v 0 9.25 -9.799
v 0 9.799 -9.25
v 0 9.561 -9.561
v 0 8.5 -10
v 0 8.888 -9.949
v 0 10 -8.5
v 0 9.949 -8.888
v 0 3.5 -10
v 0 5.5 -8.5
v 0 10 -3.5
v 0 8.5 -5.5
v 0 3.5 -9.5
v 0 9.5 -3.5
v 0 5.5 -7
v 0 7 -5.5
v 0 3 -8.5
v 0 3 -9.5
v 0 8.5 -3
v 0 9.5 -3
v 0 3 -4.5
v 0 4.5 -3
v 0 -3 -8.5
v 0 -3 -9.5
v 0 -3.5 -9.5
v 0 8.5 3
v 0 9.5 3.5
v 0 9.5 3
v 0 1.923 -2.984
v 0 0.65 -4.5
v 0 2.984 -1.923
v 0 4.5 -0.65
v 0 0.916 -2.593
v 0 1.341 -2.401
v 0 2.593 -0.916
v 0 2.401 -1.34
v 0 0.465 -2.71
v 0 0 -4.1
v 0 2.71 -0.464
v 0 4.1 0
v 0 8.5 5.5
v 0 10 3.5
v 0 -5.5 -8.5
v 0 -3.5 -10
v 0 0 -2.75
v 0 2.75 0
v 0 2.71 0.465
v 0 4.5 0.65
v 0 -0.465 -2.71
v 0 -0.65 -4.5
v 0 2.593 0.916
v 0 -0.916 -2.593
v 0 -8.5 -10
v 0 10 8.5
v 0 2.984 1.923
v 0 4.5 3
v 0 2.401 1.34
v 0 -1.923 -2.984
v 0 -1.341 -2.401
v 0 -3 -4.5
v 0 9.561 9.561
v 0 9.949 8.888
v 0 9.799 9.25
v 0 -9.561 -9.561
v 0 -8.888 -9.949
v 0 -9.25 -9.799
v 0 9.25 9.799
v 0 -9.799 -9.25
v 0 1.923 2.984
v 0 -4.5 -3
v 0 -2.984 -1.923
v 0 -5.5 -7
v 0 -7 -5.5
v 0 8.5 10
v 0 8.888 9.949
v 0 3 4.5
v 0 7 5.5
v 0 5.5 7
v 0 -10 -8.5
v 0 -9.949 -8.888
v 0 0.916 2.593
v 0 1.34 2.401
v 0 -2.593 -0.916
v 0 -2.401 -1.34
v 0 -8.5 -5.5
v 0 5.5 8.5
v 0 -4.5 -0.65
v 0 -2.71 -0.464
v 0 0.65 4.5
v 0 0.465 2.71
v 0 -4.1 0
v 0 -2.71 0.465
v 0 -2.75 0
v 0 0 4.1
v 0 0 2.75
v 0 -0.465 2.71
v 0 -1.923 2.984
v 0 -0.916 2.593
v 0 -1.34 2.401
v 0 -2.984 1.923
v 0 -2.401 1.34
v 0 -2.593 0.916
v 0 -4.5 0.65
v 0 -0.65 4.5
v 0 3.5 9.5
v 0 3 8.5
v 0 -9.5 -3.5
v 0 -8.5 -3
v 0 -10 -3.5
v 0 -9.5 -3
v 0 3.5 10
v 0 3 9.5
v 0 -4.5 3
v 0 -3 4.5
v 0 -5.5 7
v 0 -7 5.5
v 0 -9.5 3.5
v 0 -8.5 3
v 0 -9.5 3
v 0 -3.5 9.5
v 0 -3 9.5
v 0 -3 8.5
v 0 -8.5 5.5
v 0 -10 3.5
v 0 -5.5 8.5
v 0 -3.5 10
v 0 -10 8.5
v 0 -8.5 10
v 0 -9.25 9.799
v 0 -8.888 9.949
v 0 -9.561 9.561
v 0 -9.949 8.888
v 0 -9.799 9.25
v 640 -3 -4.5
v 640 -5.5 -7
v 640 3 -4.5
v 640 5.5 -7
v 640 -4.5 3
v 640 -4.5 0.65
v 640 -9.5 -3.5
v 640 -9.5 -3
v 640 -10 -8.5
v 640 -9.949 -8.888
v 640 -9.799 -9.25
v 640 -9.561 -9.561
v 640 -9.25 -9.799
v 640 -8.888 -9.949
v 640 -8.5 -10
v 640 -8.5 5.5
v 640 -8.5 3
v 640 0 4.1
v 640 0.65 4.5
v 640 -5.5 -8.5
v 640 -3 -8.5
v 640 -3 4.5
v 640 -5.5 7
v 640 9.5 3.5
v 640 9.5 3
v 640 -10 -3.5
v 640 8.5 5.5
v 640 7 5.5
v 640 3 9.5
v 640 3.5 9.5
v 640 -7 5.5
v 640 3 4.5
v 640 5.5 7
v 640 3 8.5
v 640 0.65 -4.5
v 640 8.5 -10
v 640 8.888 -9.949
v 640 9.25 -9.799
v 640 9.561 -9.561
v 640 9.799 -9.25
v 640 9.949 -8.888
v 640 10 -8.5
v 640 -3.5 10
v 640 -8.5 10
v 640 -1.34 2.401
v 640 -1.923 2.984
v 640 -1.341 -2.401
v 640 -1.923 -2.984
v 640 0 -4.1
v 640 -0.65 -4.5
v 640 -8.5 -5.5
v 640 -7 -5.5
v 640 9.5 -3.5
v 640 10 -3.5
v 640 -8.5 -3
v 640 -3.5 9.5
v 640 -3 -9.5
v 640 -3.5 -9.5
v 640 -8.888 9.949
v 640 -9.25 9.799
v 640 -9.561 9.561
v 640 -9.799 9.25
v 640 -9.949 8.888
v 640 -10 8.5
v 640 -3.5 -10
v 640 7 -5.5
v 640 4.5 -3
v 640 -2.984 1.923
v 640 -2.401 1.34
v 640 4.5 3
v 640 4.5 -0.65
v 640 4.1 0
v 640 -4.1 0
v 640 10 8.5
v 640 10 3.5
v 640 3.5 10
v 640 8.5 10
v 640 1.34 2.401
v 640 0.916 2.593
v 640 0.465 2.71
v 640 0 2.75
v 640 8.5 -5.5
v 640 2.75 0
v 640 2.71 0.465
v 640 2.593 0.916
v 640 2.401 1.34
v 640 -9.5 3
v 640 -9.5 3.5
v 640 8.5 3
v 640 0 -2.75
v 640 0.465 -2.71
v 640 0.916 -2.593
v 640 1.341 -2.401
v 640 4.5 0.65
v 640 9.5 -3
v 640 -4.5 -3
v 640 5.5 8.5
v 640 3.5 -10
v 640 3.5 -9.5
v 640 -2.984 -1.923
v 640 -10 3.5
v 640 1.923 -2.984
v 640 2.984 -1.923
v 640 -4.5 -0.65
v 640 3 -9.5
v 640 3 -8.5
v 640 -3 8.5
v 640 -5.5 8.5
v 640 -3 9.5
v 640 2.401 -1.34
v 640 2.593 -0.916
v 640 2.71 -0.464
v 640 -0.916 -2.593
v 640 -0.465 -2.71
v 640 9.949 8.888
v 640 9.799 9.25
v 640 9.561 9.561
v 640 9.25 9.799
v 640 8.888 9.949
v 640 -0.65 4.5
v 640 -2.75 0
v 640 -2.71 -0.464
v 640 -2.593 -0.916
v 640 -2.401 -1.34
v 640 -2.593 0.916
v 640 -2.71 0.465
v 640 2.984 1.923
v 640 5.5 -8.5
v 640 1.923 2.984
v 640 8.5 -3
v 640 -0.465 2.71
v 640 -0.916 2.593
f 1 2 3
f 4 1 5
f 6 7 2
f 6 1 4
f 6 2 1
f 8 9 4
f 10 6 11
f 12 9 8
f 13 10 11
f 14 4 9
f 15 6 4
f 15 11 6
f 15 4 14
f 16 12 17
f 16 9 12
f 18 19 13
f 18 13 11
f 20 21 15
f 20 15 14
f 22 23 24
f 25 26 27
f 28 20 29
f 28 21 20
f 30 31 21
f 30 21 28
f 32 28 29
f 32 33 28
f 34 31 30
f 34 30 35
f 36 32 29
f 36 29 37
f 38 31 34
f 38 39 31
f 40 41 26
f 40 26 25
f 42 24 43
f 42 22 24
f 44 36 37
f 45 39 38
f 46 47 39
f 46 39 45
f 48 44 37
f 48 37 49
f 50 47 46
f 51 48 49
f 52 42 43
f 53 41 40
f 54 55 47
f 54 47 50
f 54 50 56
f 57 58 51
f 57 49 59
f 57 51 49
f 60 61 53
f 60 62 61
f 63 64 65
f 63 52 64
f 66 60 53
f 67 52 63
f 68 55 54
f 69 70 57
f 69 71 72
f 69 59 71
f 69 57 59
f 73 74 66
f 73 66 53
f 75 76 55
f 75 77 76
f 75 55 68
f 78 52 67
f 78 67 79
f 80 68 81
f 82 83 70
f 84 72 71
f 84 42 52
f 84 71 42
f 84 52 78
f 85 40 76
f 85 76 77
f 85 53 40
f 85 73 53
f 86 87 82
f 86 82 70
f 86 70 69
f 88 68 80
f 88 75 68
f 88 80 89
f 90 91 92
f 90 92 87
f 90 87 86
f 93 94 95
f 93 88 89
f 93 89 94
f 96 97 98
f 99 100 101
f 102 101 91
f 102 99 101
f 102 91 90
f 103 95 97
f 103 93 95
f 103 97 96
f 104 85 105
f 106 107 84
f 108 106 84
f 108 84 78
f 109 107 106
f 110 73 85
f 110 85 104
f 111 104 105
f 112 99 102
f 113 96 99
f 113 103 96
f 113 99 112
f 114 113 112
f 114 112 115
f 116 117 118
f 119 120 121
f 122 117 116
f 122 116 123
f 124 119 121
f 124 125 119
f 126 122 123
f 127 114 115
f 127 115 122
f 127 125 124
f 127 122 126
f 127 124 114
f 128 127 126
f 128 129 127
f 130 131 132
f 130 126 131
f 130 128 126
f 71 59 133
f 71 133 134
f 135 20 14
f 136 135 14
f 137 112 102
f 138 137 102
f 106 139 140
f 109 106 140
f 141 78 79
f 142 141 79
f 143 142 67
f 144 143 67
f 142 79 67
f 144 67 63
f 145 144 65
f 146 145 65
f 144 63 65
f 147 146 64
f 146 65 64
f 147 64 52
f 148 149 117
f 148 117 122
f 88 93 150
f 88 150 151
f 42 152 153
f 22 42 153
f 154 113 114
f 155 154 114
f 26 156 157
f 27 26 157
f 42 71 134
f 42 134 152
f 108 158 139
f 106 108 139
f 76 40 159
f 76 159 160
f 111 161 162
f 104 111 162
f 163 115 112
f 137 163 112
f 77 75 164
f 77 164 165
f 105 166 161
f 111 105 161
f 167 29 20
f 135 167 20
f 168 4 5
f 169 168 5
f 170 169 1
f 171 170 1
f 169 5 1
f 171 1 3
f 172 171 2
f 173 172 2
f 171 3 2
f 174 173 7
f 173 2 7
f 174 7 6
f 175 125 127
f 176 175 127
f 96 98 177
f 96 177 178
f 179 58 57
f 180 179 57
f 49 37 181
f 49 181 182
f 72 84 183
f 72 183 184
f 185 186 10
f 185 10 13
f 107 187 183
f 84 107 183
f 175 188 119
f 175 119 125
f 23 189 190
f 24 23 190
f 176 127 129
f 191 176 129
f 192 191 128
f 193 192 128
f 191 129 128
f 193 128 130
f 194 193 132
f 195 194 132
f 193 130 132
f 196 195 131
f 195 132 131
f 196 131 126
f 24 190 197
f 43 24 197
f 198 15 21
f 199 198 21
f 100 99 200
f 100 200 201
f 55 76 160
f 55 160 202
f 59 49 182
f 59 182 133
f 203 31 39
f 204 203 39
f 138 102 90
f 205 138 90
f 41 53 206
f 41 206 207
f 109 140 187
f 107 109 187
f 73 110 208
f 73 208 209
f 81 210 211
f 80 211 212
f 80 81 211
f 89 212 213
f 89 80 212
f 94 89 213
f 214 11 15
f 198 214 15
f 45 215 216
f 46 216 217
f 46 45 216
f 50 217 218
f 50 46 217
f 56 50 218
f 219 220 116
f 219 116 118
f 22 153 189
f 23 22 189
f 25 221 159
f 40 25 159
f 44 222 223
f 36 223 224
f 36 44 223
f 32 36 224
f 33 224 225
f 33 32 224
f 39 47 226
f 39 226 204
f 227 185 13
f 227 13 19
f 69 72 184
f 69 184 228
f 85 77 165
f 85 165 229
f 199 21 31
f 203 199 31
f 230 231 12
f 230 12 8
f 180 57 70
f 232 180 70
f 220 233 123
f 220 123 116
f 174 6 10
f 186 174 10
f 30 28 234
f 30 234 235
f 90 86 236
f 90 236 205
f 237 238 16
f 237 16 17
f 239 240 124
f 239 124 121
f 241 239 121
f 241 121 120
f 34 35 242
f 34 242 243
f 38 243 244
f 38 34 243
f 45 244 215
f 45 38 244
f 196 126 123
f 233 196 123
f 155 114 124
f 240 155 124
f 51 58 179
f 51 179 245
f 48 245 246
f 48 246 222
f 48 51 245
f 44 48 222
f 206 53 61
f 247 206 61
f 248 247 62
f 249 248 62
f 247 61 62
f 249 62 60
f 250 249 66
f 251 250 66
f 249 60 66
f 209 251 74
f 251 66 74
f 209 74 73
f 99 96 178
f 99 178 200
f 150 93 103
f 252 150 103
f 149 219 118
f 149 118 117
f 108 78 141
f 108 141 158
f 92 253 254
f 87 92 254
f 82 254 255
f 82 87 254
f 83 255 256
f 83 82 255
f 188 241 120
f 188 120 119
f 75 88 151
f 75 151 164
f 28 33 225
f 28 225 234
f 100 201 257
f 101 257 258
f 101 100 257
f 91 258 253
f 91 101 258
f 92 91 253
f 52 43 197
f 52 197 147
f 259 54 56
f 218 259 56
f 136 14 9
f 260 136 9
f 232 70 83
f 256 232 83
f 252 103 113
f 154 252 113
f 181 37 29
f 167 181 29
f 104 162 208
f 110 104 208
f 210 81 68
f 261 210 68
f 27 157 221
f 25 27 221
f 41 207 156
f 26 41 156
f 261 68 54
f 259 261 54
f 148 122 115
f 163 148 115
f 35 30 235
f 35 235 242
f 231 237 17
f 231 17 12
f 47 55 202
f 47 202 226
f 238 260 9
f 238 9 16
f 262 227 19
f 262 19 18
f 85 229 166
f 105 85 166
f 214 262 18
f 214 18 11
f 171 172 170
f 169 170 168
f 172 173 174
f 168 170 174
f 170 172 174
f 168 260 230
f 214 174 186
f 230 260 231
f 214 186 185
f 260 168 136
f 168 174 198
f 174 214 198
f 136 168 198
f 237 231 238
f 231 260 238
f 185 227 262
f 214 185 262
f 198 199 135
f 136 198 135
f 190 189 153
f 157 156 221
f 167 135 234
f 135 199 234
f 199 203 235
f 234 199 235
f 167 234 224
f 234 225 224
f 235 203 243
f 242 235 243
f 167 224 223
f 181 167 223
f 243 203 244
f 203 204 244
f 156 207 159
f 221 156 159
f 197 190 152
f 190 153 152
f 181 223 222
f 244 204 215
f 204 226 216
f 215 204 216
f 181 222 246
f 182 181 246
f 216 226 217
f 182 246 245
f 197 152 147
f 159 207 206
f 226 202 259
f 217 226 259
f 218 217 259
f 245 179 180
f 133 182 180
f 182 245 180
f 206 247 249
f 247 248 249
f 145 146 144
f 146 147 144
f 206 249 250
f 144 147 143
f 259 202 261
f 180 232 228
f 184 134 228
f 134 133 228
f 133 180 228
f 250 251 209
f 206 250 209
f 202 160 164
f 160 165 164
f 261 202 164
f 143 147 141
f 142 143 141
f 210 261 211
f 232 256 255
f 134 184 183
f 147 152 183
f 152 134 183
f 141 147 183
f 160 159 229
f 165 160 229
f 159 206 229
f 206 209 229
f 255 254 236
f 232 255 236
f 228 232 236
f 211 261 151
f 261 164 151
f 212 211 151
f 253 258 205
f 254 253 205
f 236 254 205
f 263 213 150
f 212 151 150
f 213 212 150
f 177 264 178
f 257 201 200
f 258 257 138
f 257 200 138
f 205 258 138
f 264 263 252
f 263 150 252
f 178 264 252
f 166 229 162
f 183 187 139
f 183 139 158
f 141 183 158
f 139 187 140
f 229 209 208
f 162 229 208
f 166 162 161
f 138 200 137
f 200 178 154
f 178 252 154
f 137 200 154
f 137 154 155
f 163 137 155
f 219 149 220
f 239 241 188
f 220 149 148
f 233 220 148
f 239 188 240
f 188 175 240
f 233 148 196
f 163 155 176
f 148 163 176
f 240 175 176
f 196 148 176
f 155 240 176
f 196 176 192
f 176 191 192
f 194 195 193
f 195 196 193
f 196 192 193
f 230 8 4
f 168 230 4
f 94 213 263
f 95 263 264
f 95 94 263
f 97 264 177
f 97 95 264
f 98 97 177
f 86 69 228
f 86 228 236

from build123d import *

# Parameters (mm, degrees)
PAD_DEPTH = 640


with BuildPart() as part:
    # Sketch → Pad (new body)
    with BuildSketch(Plane.YZ):
        with BuildLine():
            Line((0, 4.1), (0.65, 4.5))
            Line((0.65, 4.5), (3, 4.5))
            Line((3, 4.5), (5.5, 7))
            Line((5.5, 7), (5.5, 8.5))
            Line((5.5, 8.5), (3, 8.5))
            Line((3, 8.5), (3, 9.5))
            Line((3, 9.5), (3.5, 9.5))
            Line((3.5, 9.5), (3.5, 10))
            Line((3.5, 10), (8.5, 10))
            ThreePointArc((10, 8.5), (9.56066, 9.56066), (8.5, 10))
            Line((10, 8.5), (10, 3.5))
            Line((10, 3.5), (9.5, 3.5))
            Line((9.5, 3.5), (9.5, 3))
            Line((9.5, 3), (8.5, 3))
            Line((8.5, 3), (8.5, 5.5))
            Line((8.5, 5.5), (7, 5.5))
            Line((7, 5.5), (4.5, 3))
            Line((4.5, 3), (4.5, 0.65))
            Line((4.5, 0.65), (4.1, 0))
            Line((4.5, -0.65), (4.1, 0))
            Line((4.5, -3), (4.5, -0.65))
            Line((7, -5.5), (4.5, -3))
            Line((8.5, -5.5), (7, -5.5))
            Line((8.5, -3), (8.5, -5.5))
            Line((9.5, -3), (8.5, -3))
            Line((9.5, -3.5), (9.5, -3))
            Line((10, -3.5), (9.5, -3.5))
            Line((10, -8.5), (10, -3.5))
            ThreePointArc((8.5, -10), (9.56066, -9.56066), (10, -8.5))
            Line((3.5, -10), (8.5, -10))
            Line((3.5, -9.5), (3.5, -10))
            Line((3, -9.5), (3.5, -9.5))
            Line((3, -8.5), (3, -9.5))
            Line((5.5, -8.5), (3, -8.5))
            Line((5.5, -7), (5.5, -8.5))
            Line((3, -4.5), (5.5, -7))
            Line((0.65, -4.5), (3, -4.5))
            Line((0, -4.1), (0.65, -4.5))
            Line((0, -4.1), (-0.65, -4.5))
            Line((-0.65, -4.5), (-3, -4.5))
            Line((-3, -4.5), (-5.5, -7))
            Line((-5.5, -7), (-5.5, -8.5))
            Line((-5.5, -8.5), (-3, -8.5))
            Line((-3, -8.5), (-3, -9.5))
            Line((-3, -9.5), (-3.5, -9.5))
            Line((-3.5, -9.5), (-3.5, -10))
            Line((-3.5, -10), (-8.5, -10))
            ThreePointArc((-10, -8.5), (-9.56066, -9.56066), (-8.5, -10))
            Line((-10, -8.5), (-10, -3.5))
            Line((-10, -3.5), (-9.5, -3.5))
            Line((-9.5, -3.5), (-9.5, -3))
            Line((-9.5, -3), (-8.5, -3))
            Line((-8.5, -3), (-8.5, -5.5))
            Line((-8.5, -5.5), (-7, -5.5))
            Line((-7, -5.5), (-4.5, -3))
            Line((-4.5, -3), (-4.5, -0.65))
            Line((-4.5, -0.65), (-4.1, 0))
            Line((-4.5, 0.65), (-4.1, 0))
            Line((-4.5, 3), (-4.5, 0.65))
            Line((-7, 5.5), (-4.5, 3))
            Line((-8.5, 5.5), (-7, 5.5))
            Line((-8.5, 3), (-8.5, 5.5))
            Line((-9.5, 3), (-8.5, 3))
            Line((-9.5, 3.5), (-9.5, 3))
            Line((-10, 3.5), (-9.5, 3.5))
            Line((-10, 8.5), (-10, 3.5))
            ThreePointArc((-8.5, 10), (-9.56066, 9.56066), (-10, 8.5))
            Line((-3.5, 10), (-8.5, 10))
            Line((-3.5, 9.5), (-3.5, 10))
            Line((-3, 9.5), (-3.5, 9.5))
            Line((-3, 8.5), (-3, 9.5))
            Line((-5.5, 8.5), (-3, 8.5))
            Line((-5.5, 7), (-5.5, 8.5))
            Line((-3, 4.5), (-5.5, 7))
            Line((-0.65, 4.5), (-3, 4.5))
            Line((0, 4.1), (-0.65, 4.5))
        make_face()
        with BuildLine():
            Line((1.340499, 2.401159), (1.923239, 2.983899))
            Line((1.923239, 2.983899), (2.983899, 1.923239))
            Line((2.983899, 1.923239), (2.401159, 1.340499))
            ThreePointArc((2.75, 0), (2.661361, 0.692573), (2.401159, 1.340499))
            ThreePointArc((2.401164, -1.34049), (2.661362, -0.692568), (2.75, 0))
            Line((2.983904, -1.92323), (2.401164, -1.34049))
            Line((1.923247, -2.983894), (2.983904, -1.92323))
            Line((1.340507, -2.401154), (1.923247, -2.983894))
            ThreePointArc((0, -2.75), (0.692577, -2.66136), (1.340507, -2.401154))
            ThreePointArc((-1.340507, -2.401154), (-0.692577, -2.66136), (0, -2.75))
            Line((-1.340507, -2.401154), (-1.923247, -2.983894))
            Line((-1.923247, -2.983894), (-2.983904, -1.92323))
            Line((-2.983904, -1.92323), (-2.401164, -1.34049))
            ThreePointArc((-2.75, 0), (-2.661362, -0.692568), (-2.401164, -1.34049))
            ThreePointArc((-2.401159, 1.340499), (-2.661361, 0.692572), (-2.75, 0))
            Line((-2.983899, 1.923239), (-2.401159, 1.340499))
            Line((-1.923239, 2.983899), (-2.983899, 1.923239))
            Line((-1.340499, 2.401159), (-1.923239, 2.983899))
            ThreePointArc((0, 2.75), (-0.692573, 2.661361), (-1.340499, 2.401159))
            ThreePointArc((1.340499, 2.401159), (0.692573, 2.661361), (0, 2.75))
        make_face(mode=Mode.SUBTRACT)
    extrude(amount=PAD_DEPTH)


solid = part.part
